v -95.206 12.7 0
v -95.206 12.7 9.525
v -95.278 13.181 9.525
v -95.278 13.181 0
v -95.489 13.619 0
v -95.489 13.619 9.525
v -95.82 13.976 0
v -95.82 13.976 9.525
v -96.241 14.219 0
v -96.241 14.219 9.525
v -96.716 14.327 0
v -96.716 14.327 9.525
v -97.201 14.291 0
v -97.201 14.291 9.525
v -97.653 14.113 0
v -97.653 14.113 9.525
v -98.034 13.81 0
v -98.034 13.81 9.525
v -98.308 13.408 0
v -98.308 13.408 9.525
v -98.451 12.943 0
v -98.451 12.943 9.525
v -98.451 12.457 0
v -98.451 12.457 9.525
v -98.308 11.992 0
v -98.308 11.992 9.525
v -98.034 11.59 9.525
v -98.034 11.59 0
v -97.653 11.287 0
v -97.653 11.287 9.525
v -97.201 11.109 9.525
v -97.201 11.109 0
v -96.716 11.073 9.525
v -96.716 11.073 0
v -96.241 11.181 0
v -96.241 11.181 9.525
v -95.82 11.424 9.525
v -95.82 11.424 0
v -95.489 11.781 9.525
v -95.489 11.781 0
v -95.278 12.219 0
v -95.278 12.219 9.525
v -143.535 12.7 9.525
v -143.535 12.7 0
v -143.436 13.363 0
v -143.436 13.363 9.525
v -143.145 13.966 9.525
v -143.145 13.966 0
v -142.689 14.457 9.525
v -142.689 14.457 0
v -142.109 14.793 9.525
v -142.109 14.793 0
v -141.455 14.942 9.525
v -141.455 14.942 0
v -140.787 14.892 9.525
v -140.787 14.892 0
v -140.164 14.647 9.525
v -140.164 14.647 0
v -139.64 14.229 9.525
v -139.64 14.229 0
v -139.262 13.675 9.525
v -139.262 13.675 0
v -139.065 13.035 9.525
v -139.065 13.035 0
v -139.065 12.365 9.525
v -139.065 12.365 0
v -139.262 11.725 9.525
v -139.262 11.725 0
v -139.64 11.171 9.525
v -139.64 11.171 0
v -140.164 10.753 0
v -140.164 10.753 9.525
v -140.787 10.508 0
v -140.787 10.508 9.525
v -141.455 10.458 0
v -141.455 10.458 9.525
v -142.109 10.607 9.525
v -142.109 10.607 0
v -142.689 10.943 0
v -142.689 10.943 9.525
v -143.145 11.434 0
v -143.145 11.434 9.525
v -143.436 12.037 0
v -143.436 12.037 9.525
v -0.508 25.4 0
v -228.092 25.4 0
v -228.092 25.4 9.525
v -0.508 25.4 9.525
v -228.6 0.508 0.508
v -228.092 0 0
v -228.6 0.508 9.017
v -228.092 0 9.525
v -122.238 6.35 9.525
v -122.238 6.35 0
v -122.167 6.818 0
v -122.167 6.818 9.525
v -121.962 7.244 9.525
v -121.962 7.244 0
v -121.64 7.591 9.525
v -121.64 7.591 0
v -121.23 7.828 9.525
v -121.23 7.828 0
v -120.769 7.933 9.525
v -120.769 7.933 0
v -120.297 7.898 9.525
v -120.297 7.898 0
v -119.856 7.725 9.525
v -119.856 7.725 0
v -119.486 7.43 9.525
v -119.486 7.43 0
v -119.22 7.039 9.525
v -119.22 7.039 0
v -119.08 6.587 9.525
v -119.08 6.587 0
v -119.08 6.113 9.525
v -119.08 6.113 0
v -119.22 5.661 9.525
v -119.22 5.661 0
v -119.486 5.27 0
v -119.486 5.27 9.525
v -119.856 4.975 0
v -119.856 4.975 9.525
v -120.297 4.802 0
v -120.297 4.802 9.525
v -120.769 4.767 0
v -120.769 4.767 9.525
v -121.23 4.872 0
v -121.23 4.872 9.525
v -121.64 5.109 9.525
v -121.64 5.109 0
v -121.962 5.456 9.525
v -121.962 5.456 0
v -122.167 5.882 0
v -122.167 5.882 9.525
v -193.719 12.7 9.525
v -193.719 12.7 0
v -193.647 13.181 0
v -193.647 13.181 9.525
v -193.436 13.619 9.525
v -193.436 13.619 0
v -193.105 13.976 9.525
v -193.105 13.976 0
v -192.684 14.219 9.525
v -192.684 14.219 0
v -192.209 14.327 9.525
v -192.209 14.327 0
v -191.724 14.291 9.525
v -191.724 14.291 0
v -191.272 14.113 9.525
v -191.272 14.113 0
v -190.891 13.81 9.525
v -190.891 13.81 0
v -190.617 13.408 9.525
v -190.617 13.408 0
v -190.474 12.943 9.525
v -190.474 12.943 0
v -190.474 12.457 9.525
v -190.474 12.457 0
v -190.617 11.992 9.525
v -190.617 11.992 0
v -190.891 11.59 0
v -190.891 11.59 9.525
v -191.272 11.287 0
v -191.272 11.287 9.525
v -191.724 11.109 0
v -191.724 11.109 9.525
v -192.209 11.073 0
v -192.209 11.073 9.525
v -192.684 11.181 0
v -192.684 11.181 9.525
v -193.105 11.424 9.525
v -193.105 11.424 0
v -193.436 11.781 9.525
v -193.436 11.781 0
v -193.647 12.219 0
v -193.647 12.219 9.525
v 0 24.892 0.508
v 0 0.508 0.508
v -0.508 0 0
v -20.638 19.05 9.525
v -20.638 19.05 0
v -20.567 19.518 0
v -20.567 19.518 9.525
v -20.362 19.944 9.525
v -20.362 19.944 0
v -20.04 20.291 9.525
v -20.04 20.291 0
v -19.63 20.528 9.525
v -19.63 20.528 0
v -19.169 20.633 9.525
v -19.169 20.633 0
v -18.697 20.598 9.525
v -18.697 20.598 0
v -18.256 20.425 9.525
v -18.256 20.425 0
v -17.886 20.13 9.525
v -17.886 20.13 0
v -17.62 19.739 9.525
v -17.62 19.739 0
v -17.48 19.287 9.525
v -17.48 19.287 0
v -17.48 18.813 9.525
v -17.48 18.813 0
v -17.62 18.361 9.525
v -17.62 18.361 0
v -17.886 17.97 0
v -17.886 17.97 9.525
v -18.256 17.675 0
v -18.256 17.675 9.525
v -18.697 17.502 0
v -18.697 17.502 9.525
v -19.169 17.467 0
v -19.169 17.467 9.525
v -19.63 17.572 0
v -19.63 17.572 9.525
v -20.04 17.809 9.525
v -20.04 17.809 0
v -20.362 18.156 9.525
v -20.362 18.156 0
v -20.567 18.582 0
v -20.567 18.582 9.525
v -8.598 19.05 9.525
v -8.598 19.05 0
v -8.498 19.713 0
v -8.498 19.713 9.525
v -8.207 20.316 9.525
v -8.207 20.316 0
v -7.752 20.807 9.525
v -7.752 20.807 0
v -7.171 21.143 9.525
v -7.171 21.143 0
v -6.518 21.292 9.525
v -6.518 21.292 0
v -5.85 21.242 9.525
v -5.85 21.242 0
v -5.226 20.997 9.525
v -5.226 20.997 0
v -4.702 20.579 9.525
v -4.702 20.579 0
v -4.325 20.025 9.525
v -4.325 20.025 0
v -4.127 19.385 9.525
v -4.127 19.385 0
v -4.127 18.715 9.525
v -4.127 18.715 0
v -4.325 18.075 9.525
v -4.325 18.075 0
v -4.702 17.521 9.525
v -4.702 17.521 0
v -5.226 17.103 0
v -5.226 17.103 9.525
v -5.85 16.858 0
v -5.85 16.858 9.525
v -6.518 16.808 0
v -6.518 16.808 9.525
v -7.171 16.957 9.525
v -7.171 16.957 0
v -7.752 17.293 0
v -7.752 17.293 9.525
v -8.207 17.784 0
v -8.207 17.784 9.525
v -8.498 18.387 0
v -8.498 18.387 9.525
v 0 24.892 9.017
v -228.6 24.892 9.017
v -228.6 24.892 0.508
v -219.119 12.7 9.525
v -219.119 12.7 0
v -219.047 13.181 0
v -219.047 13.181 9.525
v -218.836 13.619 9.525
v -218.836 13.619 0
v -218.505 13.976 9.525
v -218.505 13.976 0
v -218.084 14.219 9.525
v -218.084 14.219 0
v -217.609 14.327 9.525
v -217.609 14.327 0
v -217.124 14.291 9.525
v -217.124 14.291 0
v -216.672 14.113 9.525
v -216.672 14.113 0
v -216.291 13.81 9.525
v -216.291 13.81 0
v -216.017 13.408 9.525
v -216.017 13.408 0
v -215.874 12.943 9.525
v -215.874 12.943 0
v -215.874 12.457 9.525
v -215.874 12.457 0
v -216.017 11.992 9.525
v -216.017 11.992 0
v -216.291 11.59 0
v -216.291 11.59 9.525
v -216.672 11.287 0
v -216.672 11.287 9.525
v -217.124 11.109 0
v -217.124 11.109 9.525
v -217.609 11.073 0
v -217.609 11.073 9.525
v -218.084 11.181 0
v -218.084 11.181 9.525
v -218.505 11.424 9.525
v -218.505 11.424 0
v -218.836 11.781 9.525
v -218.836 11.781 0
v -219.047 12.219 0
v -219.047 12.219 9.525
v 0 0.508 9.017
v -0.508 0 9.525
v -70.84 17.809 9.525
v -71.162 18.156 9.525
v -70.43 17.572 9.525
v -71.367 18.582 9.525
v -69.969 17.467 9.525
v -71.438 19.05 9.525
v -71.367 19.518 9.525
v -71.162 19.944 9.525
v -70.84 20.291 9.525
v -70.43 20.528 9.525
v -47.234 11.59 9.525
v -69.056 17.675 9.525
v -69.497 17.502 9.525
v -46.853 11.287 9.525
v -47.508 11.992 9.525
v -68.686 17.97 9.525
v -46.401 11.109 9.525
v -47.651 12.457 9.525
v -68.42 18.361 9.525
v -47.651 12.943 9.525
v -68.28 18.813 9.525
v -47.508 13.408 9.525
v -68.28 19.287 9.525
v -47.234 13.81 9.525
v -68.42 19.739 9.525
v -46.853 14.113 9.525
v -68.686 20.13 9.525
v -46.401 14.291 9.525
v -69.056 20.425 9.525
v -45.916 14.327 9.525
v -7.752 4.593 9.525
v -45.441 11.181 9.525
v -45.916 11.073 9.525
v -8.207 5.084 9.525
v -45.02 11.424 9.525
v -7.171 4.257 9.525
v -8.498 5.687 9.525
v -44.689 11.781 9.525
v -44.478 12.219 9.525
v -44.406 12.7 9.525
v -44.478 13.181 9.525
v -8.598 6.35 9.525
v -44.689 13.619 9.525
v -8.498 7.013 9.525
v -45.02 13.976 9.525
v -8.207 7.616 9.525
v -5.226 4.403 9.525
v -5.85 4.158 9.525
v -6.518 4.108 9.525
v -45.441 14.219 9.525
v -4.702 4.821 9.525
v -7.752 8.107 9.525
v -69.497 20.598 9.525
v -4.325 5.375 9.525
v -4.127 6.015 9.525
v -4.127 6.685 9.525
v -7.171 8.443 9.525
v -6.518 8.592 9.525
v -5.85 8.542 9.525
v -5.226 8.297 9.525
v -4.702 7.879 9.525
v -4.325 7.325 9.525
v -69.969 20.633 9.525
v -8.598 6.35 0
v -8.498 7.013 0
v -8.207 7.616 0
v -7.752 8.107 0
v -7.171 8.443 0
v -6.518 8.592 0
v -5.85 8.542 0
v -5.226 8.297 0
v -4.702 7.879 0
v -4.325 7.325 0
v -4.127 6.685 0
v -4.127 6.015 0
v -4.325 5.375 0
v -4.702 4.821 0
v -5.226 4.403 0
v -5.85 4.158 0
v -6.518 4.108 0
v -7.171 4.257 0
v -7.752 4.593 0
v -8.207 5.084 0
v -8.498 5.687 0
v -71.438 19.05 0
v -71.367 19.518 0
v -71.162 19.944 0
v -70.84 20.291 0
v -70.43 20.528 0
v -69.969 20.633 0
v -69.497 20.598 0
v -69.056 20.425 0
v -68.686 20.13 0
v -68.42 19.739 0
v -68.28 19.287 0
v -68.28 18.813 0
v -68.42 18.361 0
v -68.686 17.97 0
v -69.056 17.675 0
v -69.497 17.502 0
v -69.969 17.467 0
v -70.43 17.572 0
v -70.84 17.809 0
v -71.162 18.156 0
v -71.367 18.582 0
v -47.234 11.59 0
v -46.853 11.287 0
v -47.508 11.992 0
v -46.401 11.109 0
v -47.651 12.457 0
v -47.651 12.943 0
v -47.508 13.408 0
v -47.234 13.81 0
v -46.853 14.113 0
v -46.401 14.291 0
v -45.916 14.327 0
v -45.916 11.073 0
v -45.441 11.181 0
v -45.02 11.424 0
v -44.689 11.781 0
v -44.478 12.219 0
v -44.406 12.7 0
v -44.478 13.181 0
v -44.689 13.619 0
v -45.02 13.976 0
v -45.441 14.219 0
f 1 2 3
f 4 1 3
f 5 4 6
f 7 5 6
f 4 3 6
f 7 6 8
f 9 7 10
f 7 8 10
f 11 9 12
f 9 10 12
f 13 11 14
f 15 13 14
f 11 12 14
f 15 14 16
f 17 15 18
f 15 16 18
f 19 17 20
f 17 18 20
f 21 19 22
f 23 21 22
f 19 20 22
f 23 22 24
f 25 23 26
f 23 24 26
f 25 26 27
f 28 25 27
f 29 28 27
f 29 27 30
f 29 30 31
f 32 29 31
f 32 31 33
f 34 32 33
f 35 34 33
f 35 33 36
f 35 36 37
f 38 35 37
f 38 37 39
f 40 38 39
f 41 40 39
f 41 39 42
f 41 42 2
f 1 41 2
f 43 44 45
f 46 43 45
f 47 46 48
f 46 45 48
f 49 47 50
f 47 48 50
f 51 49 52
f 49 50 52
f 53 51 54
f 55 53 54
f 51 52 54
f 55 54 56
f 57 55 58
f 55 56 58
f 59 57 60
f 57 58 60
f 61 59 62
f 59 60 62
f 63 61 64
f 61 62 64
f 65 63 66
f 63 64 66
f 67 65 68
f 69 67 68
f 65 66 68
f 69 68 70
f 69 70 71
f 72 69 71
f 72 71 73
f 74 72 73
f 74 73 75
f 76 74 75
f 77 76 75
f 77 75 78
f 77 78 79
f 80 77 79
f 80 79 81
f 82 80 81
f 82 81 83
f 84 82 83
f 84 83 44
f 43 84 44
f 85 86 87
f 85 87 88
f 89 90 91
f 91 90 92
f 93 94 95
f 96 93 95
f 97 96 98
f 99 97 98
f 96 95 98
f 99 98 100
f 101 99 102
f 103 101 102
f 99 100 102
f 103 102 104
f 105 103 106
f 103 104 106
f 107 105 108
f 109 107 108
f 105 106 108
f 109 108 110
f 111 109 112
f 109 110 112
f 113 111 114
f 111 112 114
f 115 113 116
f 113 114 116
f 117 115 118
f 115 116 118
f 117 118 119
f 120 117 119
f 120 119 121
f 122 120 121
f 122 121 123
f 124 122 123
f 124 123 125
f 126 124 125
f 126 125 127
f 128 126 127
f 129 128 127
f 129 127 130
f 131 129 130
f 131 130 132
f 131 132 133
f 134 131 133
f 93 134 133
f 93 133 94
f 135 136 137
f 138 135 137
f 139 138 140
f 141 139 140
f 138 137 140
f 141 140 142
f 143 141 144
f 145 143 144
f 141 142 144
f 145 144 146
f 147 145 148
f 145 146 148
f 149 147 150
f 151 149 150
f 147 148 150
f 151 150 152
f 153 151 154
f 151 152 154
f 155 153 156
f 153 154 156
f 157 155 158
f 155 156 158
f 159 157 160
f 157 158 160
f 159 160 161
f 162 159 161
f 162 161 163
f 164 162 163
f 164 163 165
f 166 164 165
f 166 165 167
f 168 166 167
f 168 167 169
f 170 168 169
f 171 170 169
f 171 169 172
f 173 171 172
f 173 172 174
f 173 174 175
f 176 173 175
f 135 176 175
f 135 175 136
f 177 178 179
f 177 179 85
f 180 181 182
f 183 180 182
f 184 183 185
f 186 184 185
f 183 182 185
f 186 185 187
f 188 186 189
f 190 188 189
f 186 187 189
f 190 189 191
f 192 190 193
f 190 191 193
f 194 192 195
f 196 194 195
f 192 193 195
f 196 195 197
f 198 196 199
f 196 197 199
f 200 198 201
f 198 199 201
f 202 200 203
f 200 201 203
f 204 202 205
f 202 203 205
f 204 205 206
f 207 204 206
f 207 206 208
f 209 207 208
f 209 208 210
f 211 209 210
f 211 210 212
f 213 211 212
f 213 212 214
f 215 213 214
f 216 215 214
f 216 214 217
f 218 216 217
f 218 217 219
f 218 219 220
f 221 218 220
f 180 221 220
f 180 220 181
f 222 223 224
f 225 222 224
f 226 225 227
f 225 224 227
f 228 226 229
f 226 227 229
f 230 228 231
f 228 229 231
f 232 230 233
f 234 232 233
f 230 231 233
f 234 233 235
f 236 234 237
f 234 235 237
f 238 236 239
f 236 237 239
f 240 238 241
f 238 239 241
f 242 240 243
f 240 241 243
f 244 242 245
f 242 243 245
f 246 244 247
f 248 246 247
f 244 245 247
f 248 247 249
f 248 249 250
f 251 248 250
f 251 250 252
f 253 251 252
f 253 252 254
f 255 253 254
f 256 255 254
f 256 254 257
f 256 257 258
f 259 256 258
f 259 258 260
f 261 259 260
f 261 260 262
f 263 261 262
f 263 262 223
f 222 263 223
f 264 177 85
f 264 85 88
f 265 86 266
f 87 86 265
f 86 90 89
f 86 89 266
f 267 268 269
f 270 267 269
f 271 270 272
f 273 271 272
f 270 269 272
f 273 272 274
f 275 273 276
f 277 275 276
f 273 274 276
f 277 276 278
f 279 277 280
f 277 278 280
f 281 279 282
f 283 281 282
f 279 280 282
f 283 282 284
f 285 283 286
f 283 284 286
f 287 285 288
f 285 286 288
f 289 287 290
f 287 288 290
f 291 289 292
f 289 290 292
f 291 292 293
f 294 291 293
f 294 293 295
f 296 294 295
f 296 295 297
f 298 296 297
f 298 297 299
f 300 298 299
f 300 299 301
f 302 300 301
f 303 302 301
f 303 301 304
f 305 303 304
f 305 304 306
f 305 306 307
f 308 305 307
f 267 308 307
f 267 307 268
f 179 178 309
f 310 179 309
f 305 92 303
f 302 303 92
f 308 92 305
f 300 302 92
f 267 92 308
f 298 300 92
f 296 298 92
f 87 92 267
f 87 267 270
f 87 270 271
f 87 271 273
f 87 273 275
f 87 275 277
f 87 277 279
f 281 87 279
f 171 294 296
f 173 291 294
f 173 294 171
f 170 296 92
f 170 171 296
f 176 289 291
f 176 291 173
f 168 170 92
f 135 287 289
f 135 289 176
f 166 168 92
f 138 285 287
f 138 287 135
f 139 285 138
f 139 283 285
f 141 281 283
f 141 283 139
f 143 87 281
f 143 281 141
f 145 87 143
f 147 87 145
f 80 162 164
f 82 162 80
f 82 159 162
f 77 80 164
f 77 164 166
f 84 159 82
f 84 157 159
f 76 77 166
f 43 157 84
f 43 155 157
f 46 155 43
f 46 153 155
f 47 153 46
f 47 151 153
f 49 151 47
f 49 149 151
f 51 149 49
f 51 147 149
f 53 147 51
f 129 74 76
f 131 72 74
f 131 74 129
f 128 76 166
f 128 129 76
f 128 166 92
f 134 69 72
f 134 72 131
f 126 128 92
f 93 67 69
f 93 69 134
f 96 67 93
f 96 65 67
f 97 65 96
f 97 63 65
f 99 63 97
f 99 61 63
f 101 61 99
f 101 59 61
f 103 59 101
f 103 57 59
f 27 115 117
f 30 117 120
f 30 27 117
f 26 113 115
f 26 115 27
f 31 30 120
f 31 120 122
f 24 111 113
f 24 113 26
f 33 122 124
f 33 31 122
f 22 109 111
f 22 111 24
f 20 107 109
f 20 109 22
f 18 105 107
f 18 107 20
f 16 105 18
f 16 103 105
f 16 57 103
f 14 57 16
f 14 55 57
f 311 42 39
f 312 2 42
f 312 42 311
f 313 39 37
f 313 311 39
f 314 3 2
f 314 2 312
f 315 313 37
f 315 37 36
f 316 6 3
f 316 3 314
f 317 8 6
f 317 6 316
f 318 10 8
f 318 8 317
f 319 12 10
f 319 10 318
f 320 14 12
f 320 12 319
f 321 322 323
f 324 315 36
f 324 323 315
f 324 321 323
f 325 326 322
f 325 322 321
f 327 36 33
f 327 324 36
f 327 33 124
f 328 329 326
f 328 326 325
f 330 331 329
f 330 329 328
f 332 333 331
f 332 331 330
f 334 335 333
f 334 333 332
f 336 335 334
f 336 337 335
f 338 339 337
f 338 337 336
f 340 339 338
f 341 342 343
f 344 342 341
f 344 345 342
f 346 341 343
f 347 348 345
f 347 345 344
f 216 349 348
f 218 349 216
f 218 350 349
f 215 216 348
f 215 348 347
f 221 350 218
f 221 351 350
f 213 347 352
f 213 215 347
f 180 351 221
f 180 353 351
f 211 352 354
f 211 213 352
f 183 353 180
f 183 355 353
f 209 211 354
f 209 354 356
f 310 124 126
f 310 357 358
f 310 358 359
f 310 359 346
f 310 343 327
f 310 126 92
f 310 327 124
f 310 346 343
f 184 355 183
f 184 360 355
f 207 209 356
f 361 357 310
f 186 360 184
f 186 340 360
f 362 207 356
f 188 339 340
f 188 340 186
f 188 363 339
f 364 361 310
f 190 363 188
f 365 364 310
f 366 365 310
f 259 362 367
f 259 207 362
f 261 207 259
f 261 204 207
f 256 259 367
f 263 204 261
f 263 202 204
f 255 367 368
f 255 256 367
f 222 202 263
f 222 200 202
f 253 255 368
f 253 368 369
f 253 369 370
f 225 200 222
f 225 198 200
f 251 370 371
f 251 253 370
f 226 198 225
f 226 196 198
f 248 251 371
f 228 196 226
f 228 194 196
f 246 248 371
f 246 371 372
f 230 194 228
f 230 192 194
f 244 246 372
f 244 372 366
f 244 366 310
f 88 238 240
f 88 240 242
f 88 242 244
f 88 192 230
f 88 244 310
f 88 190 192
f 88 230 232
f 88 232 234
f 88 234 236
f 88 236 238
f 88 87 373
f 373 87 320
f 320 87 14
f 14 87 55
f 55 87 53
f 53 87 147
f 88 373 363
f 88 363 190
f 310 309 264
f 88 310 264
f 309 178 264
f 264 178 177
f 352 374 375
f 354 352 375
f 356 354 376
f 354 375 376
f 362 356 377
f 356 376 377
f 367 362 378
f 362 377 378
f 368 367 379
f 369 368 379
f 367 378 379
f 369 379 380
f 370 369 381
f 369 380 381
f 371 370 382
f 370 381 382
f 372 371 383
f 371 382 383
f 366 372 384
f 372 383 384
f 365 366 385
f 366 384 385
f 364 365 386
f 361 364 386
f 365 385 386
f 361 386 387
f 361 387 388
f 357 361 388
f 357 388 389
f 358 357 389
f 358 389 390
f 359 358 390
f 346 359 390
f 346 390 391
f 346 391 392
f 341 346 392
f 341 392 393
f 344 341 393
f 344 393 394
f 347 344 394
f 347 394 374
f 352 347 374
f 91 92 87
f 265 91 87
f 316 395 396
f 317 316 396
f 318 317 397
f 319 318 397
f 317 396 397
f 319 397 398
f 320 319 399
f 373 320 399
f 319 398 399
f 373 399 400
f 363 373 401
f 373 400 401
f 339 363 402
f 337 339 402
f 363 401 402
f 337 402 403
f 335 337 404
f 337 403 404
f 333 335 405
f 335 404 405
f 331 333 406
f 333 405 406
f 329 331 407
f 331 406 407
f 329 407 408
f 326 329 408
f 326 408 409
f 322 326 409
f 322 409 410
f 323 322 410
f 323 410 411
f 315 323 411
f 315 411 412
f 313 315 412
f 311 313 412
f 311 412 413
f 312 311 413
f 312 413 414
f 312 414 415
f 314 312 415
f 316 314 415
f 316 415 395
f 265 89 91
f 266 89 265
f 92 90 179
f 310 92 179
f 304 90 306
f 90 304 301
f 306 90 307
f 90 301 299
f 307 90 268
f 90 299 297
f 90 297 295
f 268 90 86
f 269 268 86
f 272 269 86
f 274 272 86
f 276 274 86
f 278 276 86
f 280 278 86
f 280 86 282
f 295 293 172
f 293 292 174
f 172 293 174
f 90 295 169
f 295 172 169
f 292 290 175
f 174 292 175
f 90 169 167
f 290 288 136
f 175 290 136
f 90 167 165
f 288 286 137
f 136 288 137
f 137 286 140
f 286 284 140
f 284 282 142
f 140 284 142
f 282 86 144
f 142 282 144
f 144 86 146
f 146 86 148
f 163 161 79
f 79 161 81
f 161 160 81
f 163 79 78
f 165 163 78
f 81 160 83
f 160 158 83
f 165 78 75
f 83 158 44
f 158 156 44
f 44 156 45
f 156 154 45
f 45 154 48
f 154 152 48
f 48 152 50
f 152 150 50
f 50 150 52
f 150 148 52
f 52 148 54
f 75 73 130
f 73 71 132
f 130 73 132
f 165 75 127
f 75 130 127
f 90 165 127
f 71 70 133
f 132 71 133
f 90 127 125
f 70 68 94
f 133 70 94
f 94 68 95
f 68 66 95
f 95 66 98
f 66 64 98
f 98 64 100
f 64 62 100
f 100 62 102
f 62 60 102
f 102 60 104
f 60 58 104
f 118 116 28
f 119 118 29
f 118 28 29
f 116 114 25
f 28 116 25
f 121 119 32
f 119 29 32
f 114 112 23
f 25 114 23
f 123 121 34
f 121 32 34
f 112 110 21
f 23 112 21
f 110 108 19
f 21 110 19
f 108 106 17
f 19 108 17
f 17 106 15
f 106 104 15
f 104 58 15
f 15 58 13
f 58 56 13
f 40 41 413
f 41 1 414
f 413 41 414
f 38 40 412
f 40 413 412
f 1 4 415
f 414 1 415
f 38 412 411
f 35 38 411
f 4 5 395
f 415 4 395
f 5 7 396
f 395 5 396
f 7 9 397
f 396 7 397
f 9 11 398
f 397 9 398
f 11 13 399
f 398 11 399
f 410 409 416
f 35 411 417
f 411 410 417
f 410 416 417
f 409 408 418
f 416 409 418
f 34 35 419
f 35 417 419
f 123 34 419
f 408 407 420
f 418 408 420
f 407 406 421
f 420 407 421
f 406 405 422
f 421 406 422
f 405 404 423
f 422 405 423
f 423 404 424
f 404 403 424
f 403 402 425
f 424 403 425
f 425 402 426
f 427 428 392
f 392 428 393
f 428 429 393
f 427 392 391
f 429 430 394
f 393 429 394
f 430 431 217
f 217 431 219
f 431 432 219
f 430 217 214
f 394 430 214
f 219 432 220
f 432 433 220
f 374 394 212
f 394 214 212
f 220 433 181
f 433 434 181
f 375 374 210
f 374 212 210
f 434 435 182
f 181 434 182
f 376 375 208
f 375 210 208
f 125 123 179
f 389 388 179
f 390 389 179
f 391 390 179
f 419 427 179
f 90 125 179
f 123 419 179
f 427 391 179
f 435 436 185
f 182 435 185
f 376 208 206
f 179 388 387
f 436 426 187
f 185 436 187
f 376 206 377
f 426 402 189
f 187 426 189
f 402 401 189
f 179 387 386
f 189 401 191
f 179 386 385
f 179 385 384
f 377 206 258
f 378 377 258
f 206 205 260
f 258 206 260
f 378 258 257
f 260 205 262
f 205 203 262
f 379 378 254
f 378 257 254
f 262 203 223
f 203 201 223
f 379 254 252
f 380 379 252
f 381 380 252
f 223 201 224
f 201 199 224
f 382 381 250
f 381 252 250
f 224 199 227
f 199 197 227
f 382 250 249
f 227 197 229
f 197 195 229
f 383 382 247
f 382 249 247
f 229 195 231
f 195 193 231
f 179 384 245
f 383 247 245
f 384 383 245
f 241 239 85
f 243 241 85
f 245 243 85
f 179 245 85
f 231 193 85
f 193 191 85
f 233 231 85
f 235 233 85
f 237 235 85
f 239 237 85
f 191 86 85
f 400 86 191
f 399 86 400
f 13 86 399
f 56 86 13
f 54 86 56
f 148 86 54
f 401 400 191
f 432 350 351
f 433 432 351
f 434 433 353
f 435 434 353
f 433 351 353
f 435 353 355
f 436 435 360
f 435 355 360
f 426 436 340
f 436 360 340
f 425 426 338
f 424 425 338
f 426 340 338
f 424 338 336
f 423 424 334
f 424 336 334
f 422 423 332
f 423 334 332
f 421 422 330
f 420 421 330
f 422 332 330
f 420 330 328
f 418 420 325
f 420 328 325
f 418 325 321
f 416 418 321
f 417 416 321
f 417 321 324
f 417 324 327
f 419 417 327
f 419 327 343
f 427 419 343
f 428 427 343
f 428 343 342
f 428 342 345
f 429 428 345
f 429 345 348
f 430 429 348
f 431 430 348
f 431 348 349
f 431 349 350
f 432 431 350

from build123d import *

# Parameters (mm, degrees)
SKETCH1_W                        = 228.6
SKETCH1_H                        = 25.4
BOSS_EXTRUDE1_DEPTH              = 9.525
F_8_CLEARANCE_HOLE1_D            = 4.4958
F_8_CLEARANCE_HOLE1_DEPTH        = 25.4
F_8_CLEARANCE_HOLE1_TIP          = 1.350674586
F_8_CLEARANCE_HOLE2_D            = 4.4958
F_8_CLEARANCE_HOLE2_DEPTH        = 19.05
F_8_CLEARANCE_HOLE2_TIP          = 1.350674586
CHAMFER1_SIZE                    = 0.508
F_4_CLEARANCE_HOLE1_D            = 3.2639
F_4_CLEARANCE_HOLE2_D            = 3.2639
F_4_CLEARANCE_HOLE2_DEPTH        = 9.525
F_1_8_0_125_DIAMETER_HOLE1_D     = 3.175
F_1_8_0_125_DIAMETER_HOLE1_DEPTH = 9.525


with BuildPart() as part:
    # Sketch1 → Boss-Extrude1 (new body)
    with BuildSketch(Plane.XY):
        with Locations((-114.3, 12.7)):
            Rectangle(SKETCH1_W, SKETCH1_H)
    extrude(amount=BOSS_EXTRUDE1_DEPTH)

    # #8 Clearance Hole1
    with Locations(Plane.XY.offset(9.525)):
        with Locations((-6.35, 6.35), (-6.35, 19.05)):
            Hole(F_8_CLEARANCE_HOLE1_D / 2, depth=F_8_CLEARANCE_HOLE1_DEPTH)
            with Locations((0, 0, -(F_8_CLEARANCE_HOLE1_DEPTH + F_8_CLEARANCE_HOLE1_TIP / 2))):  # 118° drill point
                Cone(0, F_8_CLEARANCE_HOLE1_D / 2, F_8_CLEARANCE_HOLE1_TIP, mode=Mode.SUBTRACT)

    # #8 Clearance Hole2
    with Locations(Plane.XY.offset(9.525)):
        with Locations((-141.2875, 12.7)):
            Hole(F_8_CLEARANCE_HOLE2_D / 2, depth=F_8_CLEARANCE_HOLE2_DEPTH)
            with Locations((0, 0, -(F_8_CLEARANCE_HOLE2_DEPTH + F_8_CLEARANCE_HOLE2_TIP / 2))):  # 118° drill point
                Cone(0, F_8_CLEARANCE_HOLE2_D / 2, F_8_CLEARANCE_HOLE2_TIP, mode=Mode.SUBTRACT)

    # Chamfer1
    chamfer1_edges = [part.edges().sort_by_distance(p)[0] for p in [
        (-228.6, 12.7, 9.525),
        (0, 12.7, 9.525),
        (-228.6, 12.7, 0),
        (0, 12.7, 0),
        (0, 0, 4.7625),
        (-228.6, 0, 4.7625),
        (-228.6, 25.4, 4.7625),
        (0, 25.4, 4.7625),
    ]]
    chamfer(chamfer1_edges, length=CHAMFER1_SIZE)

    # #4 Clearance Hole1 (through all)
    with Locations(Plane(origin=(0, 0, 0), x_dir=(-1, 0, 0), z_dir=(0, 0, -1))):
        with Locations((96.8375, 12.7), (46.0375, 12.7)):
            Hole(F_4_CLEARANCE_HOLE1_D / 2)

    # #4 Clearance Hole2
    with Locations(Plane.XY.offset(9.525)):
        with Locations((-217.4875, 12.7), (-192.0875, 12.7)):
            Hole(F_4_CLEARANCE_HOLE2_D / 2, depth=F_4_CLEARANCE_HOLE2_DEPTH)

    # 1/8 (0.125) Diameter Hole1
    with Locations(Plane.XY.offset(9.525)):
        with Locations((-19.05, 19.05), (-69.85, 19.05), (-120.65, 6.35)):
            Hole(F_1_8_0_125_DIAMETER_HOLE1_D / 2, depth=F_1_8_0_125_DIAMETER_HOLE1_DEPTH)


solid = part.part
